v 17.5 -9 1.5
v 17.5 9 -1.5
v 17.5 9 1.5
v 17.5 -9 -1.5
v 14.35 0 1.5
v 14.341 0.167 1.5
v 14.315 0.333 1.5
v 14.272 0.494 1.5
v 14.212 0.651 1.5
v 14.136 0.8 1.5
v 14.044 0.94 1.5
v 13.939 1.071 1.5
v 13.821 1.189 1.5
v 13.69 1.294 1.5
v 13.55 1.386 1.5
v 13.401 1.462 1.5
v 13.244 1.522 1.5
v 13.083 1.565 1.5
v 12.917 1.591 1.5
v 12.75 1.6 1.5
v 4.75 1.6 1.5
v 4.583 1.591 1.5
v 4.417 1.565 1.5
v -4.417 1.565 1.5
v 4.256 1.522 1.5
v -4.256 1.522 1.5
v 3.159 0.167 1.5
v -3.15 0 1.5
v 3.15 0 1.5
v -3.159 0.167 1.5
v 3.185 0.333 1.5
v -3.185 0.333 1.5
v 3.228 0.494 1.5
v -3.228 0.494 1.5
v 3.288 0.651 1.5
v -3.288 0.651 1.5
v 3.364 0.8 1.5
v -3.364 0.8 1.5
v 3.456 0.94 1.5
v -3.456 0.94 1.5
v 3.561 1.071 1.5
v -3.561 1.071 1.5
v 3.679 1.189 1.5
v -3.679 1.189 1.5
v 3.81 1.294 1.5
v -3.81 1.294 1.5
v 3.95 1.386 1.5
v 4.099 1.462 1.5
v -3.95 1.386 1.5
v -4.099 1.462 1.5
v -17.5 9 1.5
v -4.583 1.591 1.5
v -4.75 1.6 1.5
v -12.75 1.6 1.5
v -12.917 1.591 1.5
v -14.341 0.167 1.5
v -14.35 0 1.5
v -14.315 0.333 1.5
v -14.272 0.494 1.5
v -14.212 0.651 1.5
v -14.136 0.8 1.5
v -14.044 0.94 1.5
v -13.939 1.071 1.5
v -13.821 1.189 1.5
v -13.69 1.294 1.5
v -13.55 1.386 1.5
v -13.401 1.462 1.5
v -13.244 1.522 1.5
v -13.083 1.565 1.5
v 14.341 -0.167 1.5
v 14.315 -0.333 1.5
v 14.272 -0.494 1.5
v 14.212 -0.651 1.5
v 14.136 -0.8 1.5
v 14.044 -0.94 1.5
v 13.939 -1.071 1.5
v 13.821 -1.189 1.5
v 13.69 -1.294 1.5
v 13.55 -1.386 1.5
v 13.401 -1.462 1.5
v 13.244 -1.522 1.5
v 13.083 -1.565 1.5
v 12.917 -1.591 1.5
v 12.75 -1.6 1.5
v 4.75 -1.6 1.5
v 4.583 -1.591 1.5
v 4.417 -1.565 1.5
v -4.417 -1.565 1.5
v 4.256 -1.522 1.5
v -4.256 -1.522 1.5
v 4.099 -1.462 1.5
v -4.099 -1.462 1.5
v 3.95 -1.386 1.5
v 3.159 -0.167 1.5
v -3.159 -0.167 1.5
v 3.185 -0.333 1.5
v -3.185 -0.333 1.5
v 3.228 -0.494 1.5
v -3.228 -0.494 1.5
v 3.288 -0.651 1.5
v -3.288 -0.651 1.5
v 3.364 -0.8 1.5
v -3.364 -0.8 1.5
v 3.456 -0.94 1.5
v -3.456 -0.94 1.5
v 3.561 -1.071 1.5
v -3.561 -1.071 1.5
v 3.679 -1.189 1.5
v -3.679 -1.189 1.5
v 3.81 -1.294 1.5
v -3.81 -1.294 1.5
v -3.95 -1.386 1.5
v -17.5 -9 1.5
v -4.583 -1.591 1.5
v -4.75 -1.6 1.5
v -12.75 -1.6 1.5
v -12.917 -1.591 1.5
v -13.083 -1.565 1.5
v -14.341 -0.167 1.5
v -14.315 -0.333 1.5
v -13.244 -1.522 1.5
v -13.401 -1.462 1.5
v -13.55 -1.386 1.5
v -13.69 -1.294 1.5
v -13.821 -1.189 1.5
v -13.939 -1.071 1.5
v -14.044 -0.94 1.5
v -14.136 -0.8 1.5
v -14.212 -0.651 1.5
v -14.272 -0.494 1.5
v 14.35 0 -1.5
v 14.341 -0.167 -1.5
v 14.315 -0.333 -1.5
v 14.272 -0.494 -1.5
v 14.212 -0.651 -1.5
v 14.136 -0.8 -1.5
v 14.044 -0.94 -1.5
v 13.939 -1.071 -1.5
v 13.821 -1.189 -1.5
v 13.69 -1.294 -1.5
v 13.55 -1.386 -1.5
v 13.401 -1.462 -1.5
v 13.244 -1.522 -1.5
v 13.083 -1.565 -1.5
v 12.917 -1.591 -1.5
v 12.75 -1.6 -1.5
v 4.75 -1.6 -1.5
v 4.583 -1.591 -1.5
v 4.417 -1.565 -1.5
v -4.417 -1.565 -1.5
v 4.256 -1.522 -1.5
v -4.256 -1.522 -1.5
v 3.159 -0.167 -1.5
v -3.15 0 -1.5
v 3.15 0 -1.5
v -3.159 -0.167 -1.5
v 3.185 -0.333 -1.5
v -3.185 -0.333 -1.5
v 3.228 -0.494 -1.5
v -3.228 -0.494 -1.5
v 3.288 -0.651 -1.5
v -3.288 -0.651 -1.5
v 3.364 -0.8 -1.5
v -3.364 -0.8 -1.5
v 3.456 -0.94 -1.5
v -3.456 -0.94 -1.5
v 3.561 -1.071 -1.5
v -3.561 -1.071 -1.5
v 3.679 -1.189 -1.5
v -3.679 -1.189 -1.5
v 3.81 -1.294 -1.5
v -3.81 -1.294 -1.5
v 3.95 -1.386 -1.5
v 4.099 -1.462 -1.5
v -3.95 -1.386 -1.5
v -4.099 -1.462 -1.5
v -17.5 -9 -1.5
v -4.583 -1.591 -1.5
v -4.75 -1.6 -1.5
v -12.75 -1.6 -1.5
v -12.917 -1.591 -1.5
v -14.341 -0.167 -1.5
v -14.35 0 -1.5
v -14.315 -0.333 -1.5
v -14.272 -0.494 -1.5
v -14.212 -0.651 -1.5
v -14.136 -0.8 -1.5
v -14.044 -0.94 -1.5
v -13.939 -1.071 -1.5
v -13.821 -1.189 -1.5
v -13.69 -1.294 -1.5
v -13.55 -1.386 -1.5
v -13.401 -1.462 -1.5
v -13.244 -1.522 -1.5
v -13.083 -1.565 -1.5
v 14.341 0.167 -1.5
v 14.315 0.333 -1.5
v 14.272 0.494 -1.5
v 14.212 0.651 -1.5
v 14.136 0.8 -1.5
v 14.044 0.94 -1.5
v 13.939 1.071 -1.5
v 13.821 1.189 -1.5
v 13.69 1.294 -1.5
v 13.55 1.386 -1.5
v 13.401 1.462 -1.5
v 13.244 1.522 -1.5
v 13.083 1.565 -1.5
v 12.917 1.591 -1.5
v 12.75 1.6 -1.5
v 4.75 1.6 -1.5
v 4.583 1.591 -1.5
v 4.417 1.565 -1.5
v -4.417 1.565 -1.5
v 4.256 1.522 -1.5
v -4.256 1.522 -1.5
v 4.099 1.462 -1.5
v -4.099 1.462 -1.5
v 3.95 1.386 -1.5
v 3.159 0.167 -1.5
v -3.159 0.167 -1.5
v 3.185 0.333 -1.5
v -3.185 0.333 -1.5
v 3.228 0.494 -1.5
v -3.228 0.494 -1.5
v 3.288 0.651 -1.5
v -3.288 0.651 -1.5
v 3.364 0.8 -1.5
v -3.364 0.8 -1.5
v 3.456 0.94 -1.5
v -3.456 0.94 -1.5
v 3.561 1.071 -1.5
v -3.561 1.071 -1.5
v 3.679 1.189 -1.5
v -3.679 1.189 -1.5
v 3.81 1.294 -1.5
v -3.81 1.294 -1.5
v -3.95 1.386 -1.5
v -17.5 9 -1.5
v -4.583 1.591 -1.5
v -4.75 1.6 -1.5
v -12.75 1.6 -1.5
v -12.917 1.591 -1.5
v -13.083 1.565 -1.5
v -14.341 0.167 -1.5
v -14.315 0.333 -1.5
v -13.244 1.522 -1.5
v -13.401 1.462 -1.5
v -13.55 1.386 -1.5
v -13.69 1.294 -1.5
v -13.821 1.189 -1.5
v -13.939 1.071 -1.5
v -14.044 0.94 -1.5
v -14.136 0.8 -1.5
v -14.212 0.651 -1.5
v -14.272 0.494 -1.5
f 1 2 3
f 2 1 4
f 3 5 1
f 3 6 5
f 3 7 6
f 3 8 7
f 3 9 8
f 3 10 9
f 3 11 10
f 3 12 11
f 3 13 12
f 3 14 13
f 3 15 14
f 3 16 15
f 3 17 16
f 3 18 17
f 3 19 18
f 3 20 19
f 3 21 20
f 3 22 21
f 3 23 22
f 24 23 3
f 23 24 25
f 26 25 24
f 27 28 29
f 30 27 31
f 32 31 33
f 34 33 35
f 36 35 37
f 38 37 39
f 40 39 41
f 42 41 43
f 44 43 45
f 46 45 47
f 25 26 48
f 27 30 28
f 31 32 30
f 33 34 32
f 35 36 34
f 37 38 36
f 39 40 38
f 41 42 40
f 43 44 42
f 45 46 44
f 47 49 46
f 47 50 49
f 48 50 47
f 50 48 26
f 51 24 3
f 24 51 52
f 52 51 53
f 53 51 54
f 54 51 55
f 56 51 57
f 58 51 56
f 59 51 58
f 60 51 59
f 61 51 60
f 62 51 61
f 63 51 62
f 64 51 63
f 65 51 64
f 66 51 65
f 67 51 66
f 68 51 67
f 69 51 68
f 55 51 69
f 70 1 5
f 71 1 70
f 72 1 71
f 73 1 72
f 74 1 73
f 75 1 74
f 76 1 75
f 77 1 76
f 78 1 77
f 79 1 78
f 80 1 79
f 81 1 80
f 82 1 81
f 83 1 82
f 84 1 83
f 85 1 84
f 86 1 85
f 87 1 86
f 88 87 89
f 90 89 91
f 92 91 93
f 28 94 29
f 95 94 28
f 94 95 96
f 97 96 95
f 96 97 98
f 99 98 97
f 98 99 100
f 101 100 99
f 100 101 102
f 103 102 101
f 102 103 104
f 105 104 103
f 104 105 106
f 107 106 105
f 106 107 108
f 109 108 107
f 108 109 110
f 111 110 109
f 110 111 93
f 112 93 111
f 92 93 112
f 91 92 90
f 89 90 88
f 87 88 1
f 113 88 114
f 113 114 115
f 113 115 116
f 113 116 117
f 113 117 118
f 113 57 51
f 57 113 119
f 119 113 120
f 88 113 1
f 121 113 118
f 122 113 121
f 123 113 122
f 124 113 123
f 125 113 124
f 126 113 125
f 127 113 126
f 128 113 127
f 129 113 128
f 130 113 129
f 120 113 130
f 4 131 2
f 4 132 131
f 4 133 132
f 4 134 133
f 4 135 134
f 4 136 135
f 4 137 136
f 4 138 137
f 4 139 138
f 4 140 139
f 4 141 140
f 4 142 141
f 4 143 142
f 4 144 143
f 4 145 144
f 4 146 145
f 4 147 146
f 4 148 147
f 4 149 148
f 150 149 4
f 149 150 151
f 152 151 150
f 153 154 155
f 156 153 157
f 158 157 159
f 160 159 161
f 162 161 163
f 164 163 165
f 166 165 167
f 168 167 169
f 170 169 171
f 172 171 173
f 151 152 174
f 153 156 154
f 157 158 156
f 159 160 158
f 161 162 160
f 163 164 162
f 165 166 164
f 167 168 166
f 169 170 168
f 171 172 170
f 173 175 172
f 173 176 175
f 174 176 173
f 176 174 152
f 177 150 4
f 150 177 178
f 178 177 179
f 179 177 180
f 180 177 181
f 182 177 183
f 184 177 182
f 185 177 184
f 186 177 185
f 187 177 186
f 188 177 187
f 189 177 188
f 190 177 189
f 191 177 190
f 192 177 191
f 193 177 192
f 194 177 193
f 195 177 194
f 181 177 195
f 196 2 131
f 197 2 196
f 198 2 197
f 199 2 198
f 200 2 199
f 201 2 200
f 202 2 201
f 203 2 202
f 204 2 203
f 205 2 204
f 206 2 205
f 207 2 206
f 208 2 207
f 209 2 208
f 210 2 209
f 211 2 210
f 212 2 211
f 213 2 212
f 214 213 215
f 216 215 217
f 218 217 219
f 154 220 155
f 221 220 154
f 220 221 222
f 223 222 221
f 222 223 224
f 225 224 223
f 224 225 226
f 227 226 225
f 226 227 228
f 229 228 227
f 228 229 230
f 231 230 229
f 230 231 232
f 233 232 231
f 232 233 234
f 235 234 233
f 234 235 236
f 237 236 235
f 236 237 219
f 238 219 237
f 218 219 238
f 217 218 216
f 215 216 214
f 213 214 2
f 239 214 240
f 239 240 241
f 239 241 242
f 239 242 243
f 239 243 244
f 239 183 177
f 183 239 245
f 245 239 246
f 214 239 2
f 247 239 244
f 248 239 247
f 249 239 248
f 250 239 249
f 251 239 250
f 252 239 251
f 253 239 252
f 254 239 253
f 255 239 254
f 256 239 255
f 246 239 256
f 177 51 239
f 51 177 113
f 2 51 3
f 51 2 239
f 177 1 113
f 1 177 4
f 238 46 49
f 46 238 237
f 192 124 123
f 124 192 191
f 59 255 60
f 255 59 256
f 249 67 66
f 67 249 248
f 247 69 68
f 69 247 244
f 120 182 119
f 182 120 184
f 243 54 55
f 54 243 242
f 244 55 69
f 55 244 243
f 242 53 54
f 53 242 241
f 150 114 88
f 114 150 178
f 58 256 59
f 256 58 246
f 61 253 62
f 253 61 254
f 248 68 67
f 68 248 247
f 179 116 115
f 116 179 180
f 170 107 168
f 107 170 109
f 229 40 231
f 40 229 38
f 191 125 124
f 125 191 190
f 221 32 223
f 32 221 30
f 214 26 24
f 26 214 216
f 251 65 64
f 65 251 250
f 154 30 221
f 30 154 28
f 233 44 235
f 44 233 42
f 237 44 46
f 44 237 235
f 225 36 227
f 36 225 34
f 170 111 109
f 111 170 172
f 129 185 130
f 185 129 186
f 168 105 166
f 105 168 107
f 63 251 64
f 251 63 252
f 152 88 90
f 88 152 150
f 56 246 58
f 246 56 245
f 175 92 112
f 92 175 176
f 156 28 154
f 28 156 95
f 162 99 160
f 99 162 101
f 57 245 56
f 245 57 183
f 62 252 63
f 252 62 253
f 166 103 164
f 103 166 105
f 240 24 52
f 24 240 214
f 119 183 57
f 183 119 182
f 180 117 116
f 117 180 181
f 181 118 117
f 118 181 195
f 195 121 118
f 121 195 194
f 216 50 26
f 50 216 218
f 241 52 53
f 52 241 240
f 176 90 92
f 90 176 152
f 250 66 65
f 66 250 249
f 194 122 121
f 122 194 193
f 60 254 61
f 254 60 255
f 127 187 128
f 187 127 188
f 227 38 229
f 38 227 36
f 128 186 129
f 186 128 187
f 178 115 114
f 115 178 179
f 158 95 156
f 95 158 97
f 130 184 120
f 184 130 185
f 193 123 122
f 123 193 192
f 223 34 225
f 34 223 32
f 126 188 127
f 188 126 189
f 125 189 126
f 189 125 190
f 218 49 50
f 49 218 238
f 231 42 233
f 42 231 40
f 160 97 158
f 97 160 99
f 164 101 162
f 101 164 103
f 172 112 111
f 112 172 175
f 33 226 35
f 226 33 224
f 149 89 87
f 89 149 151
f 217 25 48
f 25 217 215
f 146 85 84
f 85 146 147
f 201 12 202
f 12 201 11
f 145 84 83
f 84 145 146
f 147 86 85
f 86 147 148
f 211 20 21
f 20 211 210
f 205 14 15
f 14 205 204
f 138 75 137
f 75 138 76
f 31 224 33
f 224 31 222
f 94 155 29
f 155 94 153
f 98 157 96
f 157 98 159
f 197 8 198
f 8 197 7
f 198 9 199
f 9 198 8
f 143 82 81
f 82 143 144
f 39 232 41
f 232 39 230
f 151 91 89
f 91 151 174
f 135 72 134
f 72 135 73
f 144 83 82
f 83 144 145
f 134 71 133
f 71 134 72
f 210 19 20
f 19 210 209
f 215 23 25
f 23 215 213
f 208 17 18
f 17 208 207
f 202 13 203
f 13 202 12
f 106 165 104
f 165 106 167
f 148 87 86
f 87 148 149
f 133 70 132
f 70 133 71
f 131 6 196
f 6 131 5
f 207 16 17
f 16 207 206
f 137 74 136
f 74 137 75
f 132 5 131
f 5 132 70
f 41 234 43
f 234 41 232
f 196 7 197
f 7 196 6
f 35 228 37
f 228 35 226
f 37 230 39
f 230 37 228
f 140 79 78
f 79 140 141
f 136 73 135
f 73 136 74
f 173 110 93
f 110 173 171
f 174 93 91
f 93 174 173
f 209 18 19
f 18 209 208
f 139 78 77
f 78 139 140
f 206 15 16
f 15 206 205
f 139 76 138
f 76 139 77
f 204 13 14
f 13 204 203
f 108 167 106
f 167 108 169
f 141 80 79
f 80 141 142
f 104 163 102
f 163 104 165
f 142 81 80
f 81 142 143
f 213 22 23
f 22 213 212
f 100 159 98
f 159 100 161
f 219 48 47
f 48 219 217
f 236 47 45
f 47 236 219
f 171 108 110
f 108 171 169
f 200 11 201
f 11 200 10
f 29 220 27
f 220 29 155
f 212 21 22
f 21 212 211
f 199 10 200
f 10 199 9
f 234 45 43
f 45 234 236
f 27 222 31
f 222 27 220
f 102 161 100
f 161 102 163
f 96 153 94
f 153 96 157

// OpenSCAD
// Limit-switch mounting plate.
$fn = 60;
eps = 0.02;
plate_l = 35;
plate_w = 18;
plate_t = 3;
slot_l = 8;
module slot(x) { hull() { translate([x-slot_l/2,0,-plate_t/2-eps]) cylinder(d=3.2,h=plate_t+2*eps); translate([x+slot_l/2,0,-plate_t/2-eps]) cylinder(d=3.2,h=plate_t+2*eps); } }
difference() { cube([plate_l,plate_w,plate_t],center=true); slot(-plate_l/4); slot(plate_l/4); }
